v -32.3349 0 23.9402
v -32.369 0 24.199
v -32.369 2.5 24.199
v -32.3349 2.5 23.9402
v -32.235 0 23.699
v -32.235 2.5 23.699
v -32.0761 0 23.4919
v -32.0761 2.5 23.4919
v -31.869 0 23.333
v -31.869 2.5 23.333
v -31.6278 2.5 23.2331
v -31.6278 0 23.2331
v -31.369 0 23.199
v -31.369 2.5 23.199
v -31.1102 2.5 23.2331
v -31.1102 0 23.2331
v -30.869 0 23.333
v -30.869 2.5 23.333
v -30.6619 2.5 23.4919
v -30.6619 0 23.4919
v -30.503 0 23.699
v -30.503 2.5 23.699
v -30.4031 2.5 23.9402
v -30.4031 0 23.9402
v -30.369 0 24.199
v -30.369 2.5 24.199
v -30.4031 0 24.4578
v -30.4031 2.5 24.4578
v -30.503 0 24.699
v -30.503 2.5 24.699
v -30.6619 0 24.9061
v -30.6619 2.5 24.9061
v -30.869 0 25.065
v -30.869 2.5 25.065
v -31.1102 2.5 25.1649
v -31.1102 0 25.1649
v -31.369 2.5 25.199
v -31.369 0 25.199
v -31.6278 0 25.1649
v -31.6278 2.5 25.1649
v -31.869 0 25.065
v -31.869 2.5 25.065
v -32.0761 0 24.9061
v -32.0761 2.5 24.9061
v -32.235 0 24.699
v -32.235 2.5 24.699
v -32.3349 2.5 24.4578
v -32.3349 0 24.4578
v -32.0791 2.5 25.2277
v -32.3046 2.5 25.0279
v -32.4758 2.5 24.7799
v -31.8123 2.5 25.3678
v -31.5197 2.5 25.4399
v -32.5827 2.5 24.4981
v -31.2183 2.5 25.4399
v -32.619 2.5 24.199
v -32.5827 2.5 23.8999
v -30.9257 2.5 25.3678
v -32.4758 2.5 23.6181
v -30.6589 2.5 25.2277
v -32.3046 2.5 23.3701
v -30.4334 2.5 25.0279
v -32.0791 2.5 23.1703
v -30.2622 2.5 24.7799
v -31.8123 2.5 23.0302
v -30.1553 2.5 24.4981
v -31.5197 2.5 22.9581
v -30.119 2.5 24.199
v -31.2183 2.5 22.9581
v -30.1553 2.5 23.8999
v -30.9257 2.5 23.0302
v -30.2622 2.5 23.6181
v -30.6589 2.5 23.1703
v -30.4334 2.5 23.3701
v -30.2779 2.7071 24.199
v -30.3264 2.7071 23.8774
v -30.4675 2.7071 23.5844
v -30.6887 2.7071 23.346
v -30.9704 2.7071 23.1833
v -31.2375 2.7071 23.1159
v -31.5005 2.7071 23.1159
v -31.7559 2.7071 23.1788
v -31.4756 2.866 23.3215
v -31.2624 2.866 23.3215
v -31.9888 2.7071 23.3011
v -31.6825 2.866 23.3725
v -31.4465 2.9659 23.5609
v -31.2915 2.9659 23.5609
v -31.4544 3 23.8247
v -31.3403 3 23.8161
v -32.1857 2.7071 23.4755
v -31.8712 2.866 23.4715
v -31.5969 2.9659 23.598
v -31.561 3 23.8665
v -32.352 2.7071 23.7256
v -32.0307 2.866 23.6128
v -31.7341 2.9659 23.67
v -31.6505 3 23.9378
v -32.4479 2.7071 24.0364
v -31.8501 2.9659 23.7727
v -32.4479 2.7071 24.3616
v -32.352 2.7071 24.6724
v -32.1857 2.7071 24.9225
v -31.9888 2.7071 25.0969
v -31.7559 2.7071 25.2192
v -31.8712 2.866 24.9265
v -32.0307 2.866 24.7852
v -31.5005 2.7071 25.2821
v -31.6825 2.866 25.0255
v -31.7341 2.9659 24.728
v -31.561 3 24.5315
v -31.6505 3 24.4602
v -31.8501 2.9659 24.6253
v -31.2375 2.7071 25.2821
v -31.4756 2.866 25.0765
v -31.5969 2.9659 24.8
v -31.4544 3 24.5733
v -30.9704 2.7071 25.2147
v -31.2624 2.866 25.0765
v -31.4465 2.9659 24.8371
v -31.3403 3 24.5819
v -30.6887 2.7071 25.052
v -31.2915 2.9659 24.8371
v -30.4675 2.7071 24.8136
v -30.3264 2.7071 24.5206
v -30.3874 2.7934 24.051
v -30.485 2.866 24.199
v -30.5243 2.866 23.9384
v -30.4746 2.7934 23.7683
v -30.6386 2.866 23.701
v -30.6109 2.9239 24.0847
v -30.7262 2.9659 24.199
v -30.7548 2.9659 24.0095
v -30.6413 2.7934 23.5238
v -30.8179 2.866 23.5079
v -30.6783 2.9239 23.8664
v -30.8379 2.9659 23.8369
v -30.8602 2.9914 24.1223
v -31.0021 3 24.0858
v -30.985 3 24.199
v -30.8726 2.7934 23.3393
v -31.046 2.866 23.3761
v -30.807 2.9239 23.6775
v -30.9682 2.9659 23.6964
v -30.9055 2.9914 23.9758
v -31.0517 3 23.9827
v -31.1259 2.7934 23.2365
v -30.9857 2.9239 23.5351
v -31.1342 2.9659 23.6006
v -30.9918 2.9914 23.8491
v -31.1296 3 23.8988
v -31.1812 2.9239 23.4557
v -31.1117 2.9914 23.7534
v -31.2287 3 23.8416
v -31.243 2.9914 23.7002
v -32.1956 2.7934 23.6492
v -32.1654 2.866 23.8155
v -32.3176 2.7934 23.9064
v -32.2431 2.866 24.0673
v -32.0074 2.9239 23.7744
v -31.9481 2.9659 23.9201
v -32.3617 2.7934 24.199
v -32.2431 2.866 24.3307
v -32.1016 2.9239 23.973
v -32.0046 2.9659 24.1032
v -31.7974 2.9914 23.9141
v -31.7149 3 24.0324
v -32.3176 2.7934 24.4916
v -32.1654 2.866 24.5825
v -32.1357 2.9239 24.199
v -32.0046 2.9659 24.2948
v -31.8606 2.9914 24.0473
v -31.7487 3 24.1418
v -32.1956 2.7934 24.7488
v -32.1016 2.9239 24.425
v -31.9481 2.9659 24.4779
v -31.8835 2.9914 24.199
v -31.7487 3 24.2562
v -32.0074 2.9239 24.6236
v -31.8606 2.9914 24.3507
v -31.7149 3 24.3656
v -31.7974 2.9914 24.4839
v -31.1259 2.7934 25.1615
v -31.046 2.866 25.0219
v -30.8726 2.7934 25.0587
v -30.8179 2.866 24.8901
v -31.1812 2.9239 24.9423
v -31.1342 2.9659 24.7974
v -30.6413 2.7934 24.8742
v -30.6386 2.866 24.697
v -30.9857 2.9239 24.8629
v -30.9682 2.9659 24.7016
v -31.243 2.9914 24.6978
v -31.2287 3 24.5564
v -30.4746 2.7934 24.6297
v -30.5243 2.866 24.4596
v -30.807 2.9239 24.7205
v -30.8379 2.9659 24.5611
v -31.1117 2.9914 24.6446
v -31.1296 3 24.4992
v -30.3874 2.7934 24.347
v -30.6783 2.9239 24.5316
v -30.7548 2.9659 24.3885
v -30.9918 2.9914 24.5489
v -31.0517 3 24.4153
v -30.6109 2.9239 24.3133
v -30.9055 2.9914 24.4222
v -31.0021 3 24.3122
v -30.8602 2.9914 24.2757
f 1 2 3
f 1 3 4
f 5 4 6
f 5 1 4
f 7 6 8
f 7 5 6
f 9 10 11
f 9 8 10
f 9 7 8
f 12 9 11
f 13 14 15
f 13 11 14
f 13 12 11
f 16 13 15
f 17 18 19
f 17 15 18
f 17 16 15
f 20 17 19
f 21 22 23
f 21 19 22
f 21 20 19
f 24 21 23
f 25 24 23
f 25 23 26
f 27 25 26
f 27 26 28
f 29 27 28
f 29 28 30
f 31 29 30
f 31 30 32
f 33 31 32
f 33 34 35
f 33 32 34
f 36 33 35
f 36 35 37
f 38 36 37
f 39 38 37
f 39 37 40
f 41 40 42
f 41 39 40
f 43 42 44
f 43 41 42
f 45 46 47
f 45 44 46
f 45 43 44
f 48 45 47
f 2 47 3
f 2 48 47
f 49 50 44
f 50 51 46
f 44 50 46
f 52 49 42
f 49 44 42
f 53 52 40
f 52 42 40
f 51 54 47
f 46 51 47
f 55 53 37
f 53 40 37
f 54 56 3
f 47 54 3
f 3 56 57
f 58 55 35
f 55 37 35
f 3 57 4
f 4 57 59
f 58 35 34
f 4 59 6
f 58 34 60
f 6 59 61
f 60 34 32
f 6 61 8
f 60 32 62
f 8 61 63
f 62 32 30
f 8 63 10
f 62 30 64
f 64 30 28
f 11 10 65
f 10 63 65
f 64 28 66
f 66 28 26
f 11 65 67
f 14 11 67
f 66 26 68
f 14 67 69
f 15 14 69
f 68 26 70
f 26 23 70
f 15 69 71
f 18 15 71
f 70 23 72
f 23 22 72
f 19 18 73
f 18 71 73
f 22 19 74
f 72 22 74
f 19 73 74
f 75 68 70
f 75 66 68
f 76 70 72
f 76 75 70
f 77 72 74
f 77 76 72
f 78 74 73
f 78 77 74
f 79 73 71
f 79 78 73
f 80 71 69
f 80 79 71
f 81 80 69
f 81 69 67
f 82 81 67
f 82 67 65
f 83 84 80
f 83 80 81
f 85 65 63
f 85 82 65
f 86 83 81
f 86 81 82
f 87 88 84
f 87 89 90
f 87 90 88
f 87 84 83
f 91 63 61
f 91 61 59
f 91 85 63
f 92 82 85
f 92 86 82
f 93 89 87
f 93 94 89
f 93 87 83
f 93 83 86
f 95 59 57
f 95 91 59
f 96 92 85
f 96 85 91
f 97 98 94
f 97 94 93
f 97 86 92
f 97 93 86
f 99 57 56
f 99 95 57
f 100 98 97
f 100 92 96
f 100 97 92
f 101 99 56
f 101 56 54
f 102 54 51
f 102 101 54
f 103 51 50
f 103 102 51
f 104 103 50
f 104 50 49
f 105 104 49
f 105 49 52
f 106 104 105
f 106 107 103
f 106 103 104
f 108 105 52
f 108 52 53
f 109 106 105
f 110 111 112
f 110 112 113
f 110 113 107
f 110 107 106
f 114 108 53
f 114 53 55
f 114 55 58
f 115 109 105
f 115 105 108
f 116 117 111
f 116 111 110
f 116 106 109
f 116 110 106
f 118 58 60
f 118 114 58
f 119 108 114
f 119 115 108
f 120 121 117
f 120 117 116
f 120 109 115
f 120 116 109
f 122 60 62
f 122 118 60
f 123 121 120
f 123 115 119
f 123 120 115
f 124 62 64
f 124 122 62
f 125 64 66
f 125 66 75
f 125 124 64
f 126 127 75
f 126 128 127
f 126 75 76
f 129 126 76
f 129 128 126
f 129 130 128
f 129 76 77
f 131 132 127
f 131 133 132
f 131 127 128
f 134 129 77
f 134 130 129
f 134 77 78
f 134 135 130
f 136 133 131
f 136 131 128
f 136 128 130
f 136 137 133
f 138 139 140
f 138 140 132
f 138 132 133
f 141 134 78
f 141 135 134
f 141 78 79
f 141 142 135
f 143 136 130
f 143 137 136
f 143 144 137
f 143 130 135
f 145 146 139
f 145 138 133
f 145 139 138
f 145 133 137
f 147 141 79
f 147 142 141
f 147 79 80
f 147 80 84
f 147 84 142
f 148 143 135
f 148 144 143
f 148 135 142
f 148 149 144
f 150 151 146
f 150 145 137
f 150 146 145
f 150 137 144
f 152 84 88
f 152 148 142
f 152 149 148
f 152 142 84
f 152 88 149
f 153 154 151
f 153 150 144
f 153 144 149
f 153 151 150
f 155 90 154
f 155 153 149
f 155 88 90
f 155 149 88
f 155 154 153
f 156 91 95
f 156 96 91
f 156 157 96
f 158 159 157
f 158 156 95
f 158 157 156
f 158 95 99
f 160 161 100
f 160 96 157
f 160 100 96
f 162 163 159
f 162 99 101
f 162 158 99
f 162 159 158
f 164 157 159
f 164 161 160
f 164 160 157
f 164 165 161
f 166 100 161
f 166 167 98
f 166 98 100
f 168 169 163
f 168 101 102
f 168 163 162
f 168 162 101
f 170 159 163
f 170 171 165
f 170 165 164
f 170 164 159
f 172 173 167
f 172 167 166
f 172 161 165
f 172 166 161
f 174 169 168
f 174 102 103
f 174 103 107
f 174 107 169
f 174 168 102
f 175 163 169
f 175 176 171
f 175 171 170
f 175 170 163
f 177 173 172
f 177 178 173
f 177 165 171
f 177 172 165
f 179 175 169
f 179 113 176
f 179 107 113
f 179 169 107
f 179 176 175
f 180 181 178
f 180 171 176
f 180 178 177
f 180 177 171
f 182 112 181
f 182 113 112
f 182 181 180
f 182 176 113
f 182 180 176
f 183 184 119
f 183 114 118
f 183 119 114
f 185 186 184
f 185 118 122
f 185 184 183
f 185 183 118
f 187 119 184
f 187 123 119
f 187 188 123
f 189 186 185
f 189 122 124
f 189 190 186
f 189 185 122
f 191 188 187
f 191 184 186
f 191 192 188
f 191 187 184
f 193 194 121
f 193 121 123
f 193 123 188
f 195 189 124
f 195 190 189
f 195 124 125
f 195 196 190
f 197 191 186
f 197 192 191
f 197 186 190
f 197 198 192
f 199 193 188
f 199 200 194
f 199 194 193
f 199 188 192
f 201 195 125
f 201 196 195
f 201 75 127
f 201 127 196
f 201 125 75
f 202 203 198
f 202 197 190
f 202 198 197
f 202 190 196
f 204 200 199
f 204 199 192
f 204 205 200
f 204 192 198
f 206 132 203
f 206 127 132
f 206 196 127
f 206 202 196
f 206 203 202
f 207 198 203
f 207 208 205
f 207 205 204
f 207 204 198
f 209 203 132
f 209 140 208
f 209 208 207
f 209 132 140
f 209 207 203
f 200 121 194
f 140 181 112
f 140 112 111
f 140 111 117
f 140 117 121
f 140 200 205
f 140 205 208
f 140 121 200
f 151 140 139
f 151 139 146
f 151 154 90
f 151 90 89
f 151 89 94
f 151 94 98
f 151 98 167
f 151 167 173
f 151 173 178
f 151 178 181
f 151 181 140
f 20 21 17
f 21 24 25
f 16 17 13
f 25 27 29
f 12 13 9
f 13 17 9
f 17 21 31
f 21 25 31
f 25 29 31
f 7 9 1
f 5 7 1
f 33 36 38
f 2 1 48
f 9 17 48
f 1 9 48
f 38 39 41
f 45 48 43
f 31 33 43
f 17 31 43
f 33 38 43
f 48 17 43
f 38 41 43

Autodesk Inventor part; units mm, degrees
ref_plane "YZ Plane" through (0, 0, 0) normal (1, 0, 0) x (0, 1, 0)
ref_plane "XZ Plane" through (0, 0, 0) normal (0, 1, 0) x (-1, 0, 0)
ref_plane "XY Plane" through (0, 0, 0) normal (0, 0, 1) x (1, 0, 0)
sketch "Sketch1" plane through (0, 0, 0) normal (0, 1, 0) x (-1, 0, 0)
  circle A0 centre (31.369, 24.199) radius 1
  point P0 (0, 0)
  dimension "d0" = 2
extrude "Extrusion1" add sketch "Sketch1" along normal blind 2.5
thread "Thread1" size "M2x0.4" class "6g" standard "ANSI Metric M Profile" full length
sketch "Sketch2" plane through (-31.369, 2.5, 24.199) normal (0, 1, 0) x (1, 0, 0)
  circle A0 centre (0, 0) radius 1.25
  point P0 (31.369, 24.199)
  dimension "d5" = 2.5
extrude "Extrusion2" add sketch "Sketch2" along normal blind 0.5
fillet "Fillet1" radius 1 1 edges at (-32.619, 3, 24.199)
properties part number "screwSmall"
